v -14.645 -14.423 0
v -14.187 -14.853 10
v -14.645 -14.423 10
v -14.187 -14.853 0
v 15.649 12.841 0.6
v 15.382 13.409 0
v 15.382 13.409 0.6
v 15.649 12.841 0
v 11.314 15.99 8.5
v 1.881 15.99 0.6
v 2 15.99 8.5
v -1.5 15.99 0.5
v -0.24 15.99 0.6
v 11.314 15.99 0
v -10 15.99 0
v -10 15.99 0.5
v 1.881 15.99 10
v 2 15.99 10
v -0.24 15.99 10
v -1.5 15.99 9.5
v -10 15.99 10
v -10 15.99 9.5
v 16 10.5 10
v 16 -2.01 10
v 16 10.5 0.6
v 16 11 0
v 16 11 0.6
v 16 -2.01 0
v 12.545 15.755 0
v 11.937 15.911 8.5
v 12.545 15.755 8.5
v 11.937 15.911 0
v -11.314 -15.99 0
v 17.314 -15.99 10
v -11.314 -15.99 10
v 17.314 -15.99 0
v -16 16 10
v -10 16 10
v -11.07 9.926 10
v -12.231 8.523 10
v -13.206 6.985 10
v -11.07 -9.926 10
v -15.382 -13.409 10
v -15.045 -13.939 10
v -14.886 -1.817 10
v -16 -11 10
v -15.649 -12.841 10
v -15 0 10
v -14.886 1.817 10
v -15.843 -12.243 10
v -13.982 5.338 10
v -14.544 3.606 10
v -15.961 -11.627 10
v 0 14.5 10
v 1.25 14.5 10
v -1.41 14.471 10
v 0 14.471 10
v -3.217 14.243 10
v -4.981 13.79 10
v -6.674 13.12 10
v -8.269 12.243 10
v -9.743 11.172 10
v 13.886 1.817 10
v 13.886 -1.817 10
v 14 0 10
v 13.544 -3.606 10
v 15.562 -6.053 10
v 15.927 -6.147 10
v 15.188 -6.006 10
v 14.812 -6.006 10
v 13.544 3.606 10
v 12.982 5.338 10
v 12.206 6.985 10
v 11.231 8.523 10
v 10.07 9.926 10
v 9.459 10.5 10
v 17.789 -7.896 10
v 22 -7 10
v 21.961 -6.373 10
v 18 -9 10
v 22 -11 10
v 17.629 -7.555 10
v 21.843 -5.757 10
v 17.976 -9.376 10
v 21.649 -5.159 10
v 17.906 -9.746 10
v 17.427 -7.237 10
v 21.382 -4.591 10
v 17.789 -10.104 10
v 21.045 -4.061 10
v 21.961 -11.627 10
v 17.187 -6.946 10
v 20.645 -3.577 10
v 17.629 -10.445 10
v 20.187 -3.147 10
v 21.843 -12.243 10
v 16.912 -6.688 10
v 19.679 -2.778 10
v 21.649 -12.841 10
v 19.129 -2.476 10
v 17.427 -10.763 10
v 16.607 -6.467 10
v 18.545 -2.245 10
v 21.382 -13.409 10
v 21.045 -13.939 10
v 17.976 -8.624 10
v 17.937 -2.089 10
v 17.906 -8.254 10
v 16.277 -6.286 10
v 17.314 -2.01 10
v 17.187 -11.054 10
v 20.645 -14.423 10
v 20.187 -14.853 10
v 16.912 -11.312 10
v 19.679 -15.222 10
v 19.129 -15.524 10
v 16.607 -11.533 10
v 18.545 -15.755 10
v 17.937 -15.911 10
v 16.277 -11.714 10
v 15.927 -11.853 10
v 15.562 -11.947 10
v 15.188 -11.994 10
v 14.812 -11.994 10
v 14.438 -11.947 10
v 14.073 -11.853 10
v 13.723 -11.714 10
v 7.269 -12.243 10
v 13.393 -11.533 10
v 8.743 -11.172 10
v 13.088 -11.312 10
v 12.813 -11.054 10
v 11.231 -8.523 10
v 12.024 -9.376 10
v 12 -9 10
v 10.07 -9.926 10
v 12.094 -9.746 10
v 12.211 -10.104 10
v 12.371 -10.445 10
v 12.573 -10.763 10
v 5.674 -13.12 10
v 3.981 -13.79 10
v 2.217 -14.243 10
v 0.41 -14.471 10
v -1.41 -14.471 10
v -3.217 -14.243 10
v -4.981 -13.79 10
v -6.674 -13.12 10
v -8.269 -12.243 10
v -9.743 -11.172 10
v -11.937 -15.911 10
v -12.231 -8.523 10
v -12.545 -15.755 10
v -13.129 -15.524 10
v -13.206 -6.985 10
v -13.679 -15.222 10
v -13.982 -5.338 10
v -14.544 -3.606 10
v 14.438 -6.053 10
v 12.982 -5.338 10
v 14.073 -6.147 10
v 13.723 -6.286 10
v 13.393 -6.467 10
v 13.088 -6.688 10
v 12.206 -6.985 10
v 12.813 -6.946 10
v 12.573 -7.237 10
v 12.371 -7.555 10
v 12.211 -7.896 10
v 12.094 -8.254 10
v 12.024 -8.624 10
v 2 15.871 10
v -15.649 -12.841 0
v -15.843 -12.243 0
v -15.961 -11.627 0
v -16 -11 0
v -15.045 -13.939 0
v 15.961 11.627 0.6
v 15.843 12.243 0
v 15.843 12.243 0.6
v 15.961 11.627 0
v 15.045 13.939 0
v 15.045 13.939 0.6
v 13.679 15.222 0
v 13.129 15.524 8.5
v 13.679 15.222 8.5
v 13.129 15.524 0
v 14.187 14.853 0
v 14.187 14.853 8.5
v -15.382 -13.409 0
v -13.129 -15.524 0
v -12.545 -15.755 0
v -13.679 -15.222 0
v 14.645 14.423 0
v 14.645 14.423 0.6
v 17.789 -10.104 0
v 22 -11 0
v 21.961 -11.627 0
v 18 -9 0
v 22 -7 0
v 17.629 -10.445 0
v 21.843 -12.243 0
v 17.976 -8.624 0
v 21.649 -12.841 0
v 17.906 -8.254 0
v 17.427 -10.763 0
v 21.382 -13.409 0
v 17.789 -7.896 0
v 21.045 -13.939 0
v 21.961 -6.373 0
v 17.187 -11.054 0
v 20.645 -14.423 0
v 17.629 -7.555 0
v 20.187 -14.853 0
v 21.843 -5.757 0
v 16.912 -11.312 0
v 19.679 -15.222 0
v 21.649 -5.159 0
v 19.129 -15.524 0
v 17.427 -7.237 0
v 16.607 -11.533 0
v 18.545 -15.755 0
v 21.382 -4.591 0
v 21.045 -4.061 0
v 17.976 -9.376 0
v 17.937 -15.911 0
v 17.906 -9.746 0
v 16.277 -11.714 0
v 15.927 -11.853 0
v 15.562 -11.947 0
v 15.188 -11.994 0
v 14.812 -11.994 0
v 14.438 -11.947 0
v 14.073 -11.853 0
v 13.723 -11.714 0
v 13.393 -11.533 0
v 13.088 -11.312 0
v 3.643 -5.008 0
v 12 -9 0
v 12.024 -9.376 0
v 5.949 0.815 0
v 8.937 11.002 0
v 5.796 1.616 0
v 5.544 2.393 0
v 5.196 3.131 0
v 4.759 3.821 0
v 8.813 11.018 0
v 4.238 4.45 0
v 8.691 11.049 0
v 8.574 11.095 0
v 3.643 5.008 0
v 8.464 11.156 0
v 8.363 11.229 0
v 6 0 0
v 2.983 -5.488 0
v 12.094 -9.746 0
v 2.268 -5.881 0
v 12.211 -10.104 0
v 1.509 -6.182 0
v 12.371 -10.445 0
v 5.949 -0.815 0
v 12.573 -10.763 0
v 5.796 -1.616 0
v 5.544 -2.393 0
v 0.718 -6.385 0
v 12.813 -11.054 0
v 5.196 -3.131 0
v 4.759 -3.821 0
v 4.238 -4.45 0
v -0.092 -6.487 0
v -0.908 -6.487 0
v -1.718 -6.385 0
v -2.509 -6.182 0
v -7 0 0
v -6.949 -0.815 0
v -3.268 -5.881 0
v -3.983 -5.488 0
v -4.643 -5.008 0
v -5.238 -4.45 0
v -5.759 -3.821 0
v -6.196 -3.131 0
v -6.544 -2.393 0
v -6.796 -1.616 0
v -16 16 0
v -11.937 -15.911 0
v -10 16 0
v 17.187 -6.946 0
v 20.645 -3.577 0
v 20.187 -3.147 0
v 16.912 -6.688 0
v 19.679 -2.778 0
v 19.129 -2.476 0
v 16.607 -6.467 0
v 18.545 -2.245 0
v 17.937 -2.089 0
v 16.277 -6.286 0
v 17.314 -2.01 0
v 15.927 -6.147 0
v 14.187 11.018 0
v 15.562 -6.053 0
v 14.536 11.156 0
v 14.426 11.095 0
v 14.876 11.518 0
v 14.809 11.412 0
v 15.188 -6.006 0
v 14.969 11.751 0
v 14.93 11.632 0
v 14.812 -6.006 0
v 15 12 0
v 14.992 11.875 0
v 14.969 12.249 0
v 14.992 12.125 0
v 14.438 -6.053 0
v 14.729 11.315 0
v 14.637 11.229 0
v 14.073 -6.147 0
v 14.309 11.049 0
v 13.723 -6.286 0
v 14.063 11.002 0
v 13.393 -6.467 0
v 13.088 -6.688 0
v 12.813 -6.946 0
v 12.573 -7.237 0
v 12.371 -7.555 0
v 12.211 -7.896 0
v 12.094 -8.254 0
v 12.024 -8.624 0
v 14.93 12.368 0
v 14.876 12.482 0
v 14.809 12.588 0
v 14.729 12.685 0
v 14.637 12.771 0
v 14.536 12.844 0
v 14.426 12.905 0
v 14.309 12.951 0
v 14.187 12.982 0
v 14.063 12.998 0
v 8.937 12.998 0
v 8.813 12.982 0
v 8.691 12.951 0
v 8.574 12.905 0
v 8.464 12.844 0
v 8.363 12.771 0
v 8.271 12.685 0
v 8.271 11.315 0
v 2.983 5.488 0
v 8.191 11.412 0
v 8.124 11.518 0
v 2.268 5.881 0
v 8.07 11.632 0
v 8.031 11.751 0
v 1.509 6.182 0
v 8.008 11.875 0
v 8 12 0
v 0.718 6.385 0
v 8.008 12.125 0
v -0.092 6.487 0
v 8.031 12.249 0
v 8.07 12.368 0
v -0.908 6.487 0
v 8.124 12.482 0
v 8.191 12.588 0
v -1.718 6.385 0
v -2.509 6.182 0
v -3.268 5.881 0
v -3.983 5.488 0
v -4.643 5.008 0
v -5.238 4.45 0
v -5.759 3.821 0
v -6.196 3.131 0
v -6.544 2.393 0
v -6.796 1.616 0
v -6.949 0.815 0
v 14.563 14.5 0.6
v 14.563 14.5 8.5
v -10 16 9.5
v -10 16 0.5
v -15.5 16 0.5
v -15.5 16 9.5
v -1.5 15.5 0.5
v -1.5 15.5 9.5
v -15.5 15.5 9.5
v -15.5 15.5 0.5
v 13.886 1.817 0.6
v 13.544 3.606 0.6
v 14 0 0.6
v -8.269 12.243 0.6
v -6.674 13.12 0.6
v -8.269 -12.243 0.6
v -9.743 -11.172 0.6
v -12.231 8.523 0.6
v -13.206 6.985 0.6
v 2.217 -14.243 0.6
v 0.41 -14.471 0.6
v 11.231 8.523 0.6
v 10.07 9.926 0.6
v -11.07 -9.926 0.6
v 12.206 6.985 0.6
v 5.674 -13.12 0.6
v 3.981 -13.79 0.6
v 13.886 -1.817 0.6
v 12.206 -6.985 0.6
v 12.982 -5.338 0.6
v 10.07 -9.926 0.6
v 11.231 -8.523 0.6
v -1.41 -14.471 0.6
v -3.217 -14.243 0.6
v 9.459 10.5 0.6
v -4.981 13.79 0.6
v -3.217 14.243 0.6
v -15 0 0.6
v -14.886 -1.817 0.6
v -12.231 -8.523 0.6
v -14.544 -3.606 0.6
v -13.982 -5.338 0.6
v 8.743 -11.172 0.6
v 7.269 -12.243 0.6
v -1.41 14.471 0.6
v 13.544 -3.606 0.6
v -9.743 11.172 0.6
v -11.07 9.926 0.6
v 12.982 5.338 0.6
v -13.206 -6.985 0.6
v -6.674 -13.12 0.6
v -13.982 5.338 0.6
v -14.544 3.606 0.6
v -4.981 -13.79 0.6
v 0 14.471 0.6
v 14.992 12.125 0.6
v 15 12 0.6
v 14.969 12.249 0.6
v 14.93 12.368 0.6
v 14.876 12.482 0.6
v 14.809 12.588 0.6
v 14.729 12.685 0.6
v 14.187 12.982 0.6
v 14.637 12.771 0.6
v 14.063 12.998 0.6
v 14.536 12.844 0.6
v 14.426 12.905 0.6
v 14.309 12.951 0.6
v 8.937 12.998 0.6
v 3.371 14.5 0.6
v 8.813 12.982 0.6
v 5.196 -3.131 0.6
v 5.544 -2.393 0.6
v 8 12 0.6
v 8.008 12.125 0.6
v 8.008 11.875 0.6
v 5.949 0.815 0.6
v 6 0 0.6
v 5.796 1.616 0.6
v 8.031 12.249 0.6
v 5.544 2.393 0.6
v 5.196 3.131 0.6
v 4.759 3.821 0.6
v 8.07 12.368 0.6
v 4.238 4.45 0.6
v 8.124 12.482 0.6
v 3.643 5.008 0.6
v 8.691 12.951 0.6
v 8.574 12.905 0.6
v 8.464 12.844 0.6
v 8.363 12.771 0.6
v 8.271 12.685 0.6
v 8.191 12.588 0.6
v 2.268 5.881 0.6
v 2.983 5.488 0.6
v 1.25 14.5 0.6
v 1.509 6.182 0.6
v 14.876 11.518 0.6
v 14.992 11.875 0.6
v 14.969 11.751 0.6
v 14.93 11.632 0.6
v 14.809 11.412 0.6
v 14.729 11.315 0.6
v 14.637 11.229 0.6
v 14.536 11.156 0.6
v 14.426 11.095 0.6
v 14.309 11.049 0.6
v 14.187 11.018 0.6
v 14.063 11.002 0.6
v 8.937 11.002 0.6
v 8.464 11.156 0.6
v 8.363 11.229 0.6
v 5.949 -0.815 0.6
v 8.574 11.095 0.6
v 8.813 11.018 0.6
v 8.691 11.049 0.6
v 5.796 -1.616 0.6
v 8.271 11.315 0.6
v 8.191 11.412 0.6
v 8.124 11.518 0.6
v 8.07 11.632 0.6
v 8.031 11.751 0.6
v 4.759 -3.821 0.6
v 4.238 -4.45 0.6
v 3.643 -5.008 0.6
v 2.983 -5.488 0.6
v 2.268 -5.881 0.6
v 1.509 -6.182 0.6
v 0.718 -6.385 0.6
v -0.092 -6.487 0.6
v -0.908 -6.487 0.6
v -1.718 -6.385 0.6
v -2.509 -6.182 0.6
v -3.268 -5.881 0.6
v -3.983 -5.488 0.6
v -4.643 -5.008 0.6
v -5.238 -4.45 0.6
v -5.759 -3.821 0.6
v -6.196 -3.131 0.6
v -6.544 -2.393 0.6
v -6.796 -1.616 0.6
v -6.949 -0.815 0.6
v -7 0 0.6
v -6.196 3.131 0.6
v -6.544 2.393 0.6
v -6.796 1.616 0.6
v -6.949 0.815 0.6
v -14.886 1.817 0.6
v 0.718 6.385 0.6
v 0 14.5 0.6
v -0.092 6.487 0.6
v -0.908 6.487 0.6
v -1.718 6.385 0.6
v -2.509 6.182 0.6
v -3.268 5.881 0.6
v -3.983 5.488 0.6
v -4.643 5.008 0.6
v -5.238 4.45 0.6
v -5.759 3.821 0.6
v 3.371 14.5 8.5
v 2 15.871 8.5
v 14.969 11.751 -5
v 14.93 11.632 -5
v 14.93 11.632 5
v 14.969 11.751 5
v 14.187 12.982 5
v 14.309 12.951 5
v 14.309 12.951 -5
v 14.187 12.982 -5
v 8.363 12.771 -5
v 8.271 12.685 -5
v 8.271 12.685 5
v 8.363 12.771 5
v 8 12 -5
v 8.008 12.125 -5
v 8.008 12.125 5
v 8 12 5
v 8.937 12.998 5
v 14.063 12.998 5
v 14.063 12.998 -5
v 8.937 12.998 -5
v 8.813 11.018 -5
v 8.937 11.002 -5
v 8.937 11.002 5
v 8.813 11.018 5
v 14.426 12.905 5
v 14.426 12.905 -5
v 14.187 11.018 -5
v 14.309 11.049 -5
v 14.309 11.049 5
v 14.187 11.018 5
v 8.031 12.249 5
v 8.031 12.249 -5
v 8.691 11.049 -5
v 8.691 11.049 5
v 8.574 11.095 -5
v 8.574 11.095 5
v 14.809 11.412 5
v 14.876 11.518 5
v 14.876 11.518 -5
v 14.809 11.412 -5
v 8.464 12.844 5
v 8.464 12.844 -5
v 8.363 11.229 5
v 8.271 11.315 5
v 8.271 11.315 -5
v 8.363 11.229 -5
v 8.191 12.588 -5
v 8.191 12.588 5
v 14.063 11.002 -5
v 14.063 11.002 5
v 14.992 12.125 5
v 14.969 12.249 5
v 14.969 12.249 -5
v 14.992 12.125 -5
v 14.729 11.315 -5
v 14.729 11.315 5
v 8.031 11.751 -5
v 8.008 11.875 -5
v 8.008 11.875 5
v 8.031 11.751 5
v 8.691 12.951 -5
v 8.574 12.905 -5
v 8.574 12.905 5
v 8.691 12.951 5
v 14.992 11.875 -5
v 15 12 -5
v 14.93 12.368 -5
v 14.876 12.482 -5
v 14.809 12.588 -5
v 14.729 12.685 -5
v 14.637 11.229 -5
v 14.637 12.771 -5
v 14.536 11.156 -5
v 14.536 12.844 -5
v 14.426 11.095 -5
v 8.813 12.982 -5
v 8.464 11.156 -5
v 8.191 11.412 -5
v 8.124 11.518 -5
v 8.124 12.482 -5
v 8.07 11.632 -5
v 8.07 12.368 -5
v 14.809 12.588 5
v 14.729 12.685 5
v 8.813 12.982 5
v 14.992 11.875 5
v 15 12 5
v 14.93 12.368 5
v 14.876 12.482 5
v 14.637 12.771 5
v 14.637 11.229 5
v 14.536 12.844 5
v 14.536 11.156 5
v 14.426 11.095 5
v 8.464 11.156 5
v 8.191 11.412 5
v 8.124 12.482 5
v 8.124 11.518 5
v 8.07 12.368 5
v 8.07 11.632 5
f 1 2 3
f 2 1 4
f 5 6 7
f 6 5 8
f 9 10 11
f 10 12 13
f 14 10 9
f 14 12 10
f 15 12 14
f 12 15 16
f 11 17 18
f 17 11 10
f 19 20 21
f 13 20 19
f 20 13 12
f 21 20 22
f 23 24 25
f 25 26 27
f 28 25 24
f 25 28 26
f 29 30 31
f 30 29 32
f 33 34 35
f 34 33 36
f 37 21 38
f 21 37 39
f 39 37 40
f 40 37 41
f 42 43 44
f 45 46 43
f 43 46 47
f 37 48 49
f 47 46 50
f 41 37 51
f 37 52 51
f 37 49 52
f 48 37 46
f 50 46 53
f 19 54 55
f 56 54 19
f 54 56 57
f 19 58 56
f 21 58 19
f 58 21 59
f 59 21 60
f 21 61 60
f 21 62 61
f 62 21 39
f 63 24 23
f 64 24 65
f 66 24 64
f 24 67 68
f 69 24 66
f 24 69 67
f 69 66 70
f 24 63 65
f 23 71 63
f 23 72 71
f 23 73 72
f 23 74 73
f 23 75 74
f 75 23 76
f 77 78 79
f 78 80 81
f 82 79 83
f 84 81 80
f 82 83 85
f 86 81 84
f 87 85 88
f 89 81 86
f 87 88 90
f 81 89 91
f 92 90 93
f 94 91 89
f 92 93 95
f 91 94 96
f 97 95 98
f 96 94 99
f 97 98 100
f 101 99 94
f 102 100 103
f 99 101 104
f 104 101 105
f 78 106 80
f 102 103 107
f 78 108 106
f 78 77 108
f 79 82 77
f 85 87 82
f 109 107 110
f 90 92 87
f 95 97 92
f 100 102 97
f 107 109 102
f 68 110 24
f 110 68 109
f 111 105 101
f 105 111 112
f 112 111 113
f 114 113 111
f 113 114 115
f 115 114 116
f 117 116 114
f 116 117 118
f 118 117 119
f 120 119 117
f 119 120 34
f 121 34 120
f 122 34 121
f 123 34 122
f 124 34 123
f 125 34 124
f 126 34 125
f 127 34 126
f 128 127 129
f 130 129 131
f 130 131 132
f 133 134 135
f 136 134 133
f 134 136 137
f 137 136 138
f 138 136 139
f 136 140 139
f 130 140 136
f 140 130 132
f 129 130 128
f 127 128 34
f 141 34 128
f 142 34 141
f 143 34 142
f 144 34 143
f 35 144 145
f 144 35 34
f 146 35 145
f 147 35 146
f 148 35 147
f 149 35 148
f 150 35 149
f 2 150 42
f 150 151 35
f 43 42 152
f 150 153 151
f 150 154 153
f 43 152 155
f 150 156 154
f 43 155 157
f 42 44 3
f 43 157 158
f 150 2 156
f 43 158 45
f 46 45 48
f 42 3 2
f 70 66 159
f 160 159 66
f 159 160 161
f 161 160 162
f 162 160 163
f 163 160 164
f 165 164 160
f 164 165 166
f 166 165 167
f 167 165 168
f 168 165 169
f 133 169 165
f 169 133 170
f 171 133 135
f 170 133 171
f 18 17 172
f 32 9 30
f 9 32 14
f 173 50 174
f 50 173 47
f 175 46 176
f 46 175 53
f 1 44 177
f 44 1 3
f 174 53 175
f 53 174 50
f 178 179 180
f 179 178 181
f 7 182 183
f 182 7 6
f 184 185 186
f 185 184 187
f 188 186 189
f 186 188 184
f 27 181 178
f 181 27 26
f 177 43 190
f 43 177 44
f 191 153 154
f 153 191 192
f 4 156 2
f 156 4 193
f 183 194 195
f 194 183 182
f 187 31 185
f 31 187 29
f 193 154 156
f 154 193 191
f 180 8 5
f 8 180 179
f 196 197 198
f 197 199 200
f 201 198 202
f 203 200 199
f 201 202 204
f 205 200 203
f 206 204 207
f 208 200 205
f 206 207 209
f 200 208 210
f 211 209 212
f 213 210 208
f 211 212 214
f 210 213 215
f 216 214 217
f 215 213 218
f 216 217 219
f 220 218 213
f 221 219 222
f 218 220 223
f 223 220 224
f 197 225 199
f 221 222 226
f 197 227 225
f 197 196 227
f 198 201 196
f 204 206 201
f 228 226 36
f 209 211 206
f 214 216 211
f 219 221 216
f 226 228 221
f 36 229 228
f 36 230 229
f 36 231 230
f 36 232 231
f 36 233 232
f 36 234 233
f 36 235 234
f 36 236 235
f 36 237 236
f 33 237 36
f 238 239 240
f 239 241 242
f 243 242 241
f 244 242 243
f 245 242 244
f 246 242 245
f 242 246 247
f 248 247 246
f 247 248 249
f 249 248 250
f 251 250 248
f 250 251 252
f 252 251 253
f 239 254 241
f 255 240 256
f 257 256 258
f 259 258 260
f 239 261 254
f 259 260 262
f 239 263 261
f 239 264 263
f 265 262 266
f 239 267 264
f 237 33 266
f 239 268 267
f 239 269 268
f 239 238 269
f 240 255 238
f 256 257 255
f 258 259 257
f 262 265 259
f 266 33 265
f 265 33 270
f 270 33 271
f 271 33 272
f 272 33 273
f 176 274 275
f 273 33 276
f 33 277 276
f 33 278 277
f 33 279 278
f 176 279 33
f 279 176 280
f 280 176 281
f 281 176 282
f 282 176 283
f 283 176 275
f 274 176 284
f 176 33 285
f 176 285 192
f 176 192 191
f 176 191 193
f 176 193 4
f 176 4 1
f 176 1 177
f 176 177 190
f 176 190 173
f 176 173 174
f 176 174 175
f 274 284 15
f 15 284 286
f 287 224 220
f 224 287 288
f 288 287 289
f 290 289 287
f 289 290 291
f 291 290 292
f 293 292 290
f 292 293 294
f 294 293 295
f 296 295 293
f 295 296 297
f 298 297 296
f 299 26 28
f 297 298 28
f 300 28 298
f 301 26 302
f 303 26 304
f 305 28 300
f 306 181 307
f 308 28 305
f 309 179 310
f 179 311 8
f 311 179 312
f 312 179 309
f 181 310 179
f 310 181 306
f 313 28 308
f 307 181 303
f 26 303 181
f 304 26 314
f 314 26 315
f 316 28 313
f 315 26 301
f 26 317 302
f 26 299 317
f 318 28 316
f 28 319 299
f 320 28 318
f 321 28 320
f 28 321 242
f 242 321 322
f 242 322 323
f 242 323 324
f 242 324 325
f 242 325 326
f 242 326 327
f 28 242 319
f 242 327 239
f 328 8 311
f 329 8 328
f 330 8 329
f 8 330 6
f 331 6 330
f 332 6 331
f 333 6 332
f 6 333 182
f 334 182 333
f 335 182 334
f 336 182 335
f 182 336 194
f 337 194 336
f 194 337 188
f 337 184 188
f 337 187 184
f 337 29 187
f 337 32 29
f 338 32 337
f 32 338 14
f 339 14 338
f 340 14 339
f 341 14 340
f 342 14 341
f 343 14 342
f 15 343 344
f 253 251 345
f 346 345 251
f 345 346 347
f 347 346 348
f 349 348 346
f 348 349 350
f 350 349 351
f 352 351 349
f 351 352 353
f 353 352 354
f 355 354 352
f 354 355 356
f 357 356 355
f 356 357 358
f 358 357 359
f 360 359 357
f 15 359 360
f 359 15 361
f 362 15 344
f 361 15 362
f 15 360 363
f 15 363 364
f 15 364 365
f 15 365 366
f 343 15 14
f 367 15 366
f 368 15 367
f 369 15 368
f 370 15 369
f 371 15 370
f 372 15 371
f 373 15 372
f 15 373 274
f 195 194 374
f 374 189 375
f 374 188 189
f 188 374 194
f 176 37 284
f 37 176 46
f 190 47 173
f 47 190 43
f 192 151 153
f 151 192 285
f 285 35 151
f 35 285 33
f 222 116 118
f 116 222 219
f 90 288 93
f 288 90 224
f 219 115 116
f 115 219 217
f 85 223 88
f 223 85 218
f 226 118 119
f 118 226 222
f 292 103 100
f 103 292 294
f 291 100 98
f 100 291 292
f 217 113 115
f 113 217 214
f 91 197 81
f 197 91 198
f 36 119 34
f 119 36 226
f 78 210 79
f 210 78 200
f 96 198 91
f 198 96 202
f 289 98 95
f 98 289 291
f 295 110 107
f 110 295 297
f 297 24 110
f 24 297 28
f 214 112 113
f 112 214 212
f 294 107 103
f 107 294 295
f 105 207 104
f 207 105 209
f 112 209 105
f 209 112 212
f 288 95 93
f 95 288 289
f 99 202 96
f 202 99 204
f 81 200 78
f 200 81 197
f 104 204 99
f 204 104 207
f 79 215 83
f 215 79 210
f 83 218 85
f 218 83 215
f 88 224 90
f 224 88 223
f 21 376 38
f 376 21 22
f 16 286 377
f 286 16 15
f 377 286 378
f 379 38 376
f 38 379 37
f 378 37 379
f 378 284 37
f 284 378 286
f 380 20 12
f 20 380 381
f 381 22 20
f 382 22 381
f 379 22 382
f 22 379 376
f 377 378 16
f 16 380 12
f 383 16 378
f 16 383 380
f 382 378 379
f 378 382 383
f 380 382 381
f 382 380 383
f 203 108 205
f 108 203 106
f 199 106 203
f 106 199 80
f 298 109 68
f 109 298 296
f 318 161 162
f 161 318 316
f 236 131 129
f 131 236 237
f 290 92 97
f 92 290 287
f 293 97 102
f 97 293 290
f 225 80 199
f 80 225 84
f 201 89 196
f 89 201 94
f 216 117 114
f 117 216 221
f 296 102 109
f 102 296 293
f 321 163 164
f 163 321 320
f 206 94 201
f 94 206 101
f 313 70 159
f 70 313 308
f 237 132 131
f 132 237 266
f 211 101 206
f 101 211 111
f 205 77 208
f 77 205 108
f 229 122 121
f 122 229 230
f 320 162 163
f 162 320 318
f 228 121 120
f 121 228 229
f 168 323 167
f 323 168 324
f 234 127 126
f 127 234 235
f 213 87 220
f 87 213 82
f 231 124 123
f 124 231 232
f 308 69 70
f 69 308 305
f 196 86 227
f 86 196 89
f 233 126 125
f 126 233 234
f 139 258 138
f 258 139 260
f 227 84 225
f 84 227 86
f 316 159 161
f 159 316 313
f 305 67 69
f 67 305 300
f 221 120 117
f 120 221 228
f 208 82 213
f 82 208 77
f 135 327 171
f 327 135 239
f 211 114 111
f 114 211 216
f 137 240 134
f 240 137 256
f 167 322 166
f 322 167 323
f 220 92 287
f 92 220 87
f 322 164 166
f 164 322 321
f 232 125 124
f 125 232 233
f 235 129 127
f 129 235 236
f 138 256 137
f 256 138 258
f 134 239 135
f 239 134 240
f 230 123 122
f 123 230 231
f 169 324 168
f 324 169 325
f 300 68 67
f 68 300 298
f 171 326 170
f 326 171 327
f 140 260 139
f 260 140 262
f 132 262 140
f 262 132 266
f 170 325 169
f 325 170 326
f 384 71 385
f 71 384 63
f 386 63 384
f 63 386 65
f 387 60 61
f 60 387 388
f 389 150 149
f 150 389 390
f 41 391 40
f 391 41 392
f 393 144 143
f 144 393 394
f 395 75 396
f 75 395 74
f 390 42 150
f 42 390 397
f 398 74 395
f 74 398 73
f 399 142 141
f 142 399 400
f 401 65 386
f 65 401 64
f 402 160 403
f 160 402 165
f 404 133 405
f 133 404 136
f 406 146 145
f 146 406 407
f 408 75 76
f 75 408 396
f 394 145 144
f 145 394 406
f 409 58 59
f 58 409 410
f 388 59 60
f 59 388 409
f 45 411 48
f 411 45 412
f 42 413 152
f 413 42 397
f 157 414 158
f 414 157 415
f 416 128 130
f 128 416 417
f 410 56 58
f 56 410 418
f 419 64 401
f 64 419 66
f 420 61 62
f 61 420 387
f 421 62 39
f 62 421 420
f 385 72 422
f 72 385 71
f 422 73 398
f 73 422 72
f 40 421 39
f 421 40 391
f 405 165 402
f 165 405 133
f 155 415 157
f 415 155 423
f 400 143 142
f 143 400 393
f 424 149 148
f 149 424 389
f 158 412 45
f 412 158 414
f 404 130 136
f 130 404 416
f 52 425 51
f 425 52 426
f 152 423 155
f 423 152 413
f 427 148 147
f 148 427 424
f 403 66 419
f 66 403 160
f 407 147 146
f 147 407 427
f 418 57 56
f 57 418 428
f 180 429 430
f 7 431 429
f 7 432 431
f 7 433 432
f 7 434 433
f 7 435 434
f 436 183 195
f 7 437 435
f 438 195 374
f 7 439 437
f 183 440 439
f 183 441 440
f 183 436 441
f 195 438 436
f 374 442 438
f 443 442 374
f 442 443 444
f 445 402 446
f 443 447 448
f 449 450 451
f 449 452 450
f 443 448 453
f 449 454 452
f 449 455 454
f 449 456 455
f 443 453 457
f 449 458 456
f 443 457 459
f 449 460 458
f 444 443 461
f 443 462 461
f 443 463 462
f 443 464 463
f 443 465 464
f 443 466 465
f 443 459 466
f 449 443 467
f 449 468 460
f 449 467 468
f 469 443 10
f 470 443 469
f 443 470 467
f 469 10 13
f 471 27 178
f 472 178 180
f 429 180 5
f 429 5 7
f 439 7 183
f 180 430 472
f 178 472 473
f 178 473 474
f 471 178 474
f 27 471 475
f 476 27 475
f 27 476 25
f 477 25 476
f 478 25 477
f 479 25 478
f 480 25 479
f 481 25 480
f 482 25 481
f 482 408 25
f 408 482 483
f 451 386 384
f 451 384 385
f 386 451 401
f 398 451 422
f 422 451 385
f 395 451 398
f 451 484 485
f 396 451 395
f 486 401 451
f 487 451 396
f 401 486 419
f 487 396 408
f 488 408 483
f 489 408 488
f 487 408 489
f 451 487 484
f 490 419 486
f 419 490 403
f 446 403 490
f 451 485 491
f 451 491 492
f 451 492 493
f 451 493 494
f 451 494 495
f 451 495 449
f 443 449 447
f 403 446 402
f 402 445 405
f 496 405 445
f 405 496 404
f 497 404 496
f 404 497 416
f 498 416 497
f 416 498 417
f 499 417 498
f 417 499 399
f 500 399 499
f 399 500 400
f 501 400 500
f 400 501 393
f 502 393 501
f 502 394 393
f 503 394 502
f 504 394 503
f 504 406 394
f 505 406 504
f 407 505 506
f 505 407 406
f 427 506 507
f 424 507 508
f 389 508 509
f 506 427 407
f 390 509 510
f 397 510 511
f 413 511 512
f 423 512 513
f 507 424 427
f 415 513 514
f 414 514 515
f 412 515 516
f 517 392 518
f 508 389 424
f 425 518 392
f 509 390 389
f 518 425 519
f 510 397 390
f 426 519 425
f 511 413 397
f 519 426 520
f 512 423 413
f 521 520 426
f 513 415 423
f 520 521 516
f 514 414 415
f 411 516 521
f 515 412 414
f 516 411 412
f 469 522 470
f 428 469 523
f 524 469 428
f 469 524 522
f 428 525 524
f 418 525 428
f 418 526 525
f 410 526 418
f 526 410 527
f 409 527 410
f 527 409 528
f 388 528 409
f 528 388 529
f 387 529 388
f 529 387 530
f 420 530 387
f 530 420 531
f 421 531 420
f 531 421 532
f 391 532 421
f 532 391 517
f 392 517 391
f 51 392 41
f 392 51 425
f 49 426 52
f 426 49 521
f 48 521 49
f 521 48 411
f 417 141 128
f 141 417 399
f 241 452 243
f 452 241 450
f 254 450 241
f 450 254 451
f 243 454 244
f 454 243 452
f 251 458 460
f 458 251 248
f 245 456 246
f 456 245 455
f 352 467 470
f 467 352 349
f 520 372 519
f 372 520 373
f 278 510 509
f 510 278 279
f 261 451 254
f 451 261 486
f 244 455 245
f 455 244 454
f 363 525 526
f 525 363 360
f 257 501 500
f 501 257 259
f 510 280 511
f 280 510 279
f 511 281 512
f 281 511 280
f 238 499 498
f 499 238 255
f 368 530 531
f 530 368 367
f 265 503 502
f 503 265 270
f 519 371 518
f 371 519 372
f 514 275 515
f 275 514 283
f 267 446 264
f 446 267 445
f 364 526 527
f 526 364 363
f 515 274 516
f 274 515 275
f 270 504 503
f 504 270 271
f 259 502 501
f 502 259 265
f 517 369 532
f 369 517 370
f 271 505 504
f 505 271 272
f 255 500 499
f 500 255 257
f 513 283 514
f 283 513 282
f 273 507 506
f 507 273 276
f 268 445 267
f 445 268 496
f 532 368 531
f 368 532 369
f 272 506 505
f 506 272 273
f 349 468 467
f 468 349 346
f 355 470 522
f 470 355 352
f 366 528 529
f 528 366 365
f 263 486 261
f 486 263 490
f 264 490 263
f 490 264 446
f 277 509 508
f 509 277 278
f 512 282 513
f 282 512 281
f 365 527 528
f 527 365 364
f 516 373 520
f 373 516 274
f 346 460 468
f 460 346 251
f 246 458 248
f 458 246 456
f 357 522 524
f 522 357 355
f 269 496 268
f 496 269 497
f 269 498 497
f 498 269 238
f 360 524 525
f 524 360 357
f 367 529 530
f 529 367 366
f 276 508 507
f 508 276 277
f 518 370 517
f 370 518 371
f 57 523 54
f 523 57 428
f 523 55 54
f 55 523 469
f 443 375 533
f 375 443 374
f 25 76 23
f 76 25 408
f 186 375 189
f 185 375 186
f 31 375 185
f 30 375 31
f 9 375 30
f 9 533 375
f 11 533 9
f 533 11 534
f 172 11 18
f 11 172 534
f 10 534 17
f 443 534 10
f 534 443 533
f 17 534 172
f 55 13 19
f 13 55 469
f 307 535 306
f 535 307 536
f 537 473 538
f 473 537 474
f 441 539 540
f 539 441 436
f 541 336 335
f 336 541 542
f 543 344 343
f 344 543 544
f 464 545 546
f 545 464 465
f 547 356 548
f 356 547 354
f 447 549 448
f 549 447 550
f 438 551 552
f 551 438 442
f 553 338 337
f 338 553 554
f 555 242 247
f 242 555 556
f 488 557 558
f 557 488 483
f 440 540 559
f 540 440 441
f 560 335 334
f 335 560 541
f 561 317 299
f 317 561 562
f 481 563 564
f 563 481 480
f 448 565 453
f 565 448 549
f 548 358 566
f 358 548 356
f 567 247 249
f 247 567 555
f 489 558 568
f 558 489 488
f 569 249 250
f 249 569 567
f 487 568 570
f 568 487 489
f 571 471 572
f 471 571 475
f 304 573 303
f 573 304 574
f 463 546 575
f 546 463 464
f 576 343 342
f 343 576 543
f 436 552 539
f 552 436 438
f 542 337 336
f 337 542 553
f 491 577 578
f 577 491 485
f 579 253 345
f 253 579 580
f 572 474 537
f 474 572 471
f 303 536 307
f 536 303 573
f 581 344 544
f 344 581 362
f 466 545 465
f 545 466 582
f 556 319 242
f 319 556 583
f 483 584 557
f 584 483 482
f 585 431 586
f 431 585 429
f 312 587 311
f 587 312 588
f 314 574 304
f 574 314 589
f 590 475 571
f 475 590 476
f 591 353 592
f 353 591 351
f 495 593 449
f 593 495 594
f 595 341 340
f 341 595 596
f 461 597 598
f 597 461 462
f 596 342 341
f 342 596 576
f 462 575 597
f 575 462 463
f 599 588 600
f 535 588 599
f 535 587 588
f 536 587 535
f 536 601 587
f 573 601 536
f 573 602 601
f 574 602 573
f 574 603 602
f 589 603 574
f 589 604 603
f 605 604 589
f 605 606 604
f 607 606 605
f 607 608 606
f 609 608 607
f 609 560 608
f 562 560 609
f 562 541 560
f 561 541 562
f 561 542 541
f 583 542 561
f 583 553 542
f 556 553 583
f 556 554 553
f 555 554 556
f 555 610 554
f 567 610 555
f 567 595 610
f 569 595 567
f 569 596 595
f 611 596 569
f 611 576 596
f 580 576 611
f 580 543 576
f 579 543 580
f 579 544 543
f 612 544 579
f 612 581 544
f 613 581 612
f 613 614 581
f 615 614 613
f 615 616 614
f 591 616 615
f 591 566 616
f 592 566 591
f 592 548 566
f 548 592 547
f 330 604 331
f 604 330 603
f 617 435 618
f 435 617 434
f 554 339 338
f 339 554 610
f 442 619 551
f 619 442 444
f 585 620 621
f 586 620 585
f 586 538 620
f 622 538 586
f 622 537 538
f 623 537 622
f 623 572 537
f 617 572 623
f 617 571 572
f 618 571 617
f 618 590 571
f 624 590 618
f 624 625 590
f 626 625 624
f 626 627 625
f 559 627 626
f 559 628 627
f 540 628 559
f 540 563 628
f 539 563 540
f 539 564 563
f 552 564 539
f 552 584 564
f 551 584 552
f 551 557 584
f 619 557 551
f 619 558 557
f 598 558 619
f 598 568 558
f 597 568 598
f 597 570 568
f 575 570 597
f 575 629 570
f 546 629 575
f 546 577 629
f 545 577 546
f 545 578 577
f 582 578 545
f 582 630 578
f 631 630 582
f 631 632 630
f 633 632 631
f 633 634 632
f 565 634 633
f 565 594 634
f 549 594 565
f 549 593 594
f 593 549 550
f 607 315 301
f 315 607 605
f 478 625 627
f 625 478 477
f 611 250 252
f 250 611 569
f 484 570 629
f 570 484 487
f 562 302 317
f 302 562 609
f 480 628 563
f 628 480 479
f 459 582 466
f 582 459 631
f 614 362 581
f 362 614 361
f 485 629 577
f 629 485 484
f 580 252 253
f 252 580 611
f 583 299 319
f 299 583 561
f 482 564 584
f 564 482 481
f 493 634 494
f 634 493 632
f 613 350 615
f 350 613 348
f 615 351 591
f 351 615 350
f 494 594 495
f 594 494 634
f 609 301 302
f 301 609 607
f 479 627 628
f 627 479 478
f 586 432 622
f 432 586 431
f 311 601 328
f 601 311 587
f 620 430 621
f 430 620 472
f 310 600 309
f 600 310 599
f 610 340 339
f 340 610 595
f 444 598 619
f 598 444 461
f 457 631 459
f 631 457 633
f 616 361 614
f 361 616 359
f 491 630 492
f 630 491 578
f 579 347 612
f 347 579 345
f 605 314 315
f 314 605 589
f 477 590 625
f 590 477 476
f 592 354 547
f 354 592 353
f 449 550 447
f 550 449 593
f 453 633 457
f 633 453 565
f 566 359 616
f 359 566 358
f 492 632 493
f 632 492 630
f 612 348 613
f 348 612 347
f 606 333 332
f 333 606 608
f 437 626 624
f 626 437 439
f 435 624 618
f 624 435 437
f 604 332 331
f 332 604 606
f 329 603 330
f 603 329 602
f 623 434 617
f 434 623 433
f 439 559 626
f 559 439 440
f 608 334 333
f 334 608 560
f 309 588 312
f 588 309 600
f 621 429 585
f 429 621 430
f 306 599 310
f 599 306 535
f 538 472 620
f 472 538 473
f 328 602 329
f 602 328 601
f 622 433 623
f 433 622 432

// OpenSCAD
$fn = 50;


union() {
	difference() {
		union() {
			hull() {
				translate(v = [-11.0000000000, 11.0000000000, 0]) {
					cylinder(h = 10, r = 5);
				}
				translate(v = [11.0000000000, 11.0000000000, 0]) {
					cylinder(h = 10, r = 5);
				}
				translate(v = [-11.0000000000, -11.0000000000, 0]) {
					cylinder(h = 10, r = 5);
				}
				translate(v = [11.0000000000, -11.0000000000, 0]) {
					cylinder(h = 10, r = 5);
				}
			}
			translate(v = [7.5000000000, -9.0000000000, 0]) {
				hull() {
					translate(v = [-9.5000000000, 2.0000000000, 0]) {
						cylinder(h = 10, r = 5);
					}
					translate(v = [9.5000000000, 2.0000000000, 0]) {
						cylinder(h = 10, r = 5);
					}
					translate(v = [-9.5000000000, -2.0000000000, 0]) {
						cylinder(h = 10, r = 5);
					}
					translate(v = [9.5000000000, -2.0000000000, 0]) {
						cylinder(h = 10, r = 5);
					}
				}
			}
			translate(v = [-16.0000000000, 10.0000000000, 0]) {
				cube(size = [6, 6, 10]);
			}
		}
		union() {
			translate(v = [-15.5000000000, 15.5000000000, 0.5000000000]) {
				cube(size = [14, 0.5000000000, 9.0000000000]);
			}
			translate(v = [15.0000000000, -9.0000000000, -100.0000000000]) {
				cylinder(h = 200, r = 3.0000000000);
			}
			translate(v = [-0.5000000000, 0.0000000000, 0.6000000000]) {
				cylinder(h = 12.4000000000, r = 14.5000000000);
			}
			translate(v = [-0.5000000000, 0.0000000000, -5.0000000000]) {
				cylinder(h = 10, r = 6.5000000000);
			}
			translate(v = [0.0000000000, 10.5000000000, 0.6000000000]) {
				cube(size = [16.0000000000, 4, 12.4000000000]);
			}
			translate(v = [2.0000000000, 10.5000000000, 8.5000000000]) {
				cube(size = [14.0000000000, 7, 1.5000000000]);
			}
			translate(v = [-3.0000000000, 18.7500000000, 0.6000000000]) {
				rotate(a = [0, 0, -45]) {
					cube(size = [10, 1.5000000000, 12.4000000000]);
				}
			}
			translate(v = [2.2500000000, 11.0000000000, 0.6000000000]) {
				cube(size = [7.5000000000, 2, 9.4000000000]);
			}
		}
	}
	union() {
		translate(v = [11.5000000000, 12, -5.0000000000]) {
			rotate(a = [0, 0, 0]) {
				difference() {
					union() {
						hull() {
							translate(v = [2.5000000000, 0, 0]) {
								cylinder(h = 10, r = 1.0000000000, r1 = 1.0000000000, r2 = 1.0000000000);
							}
							translate(v = [-2.5000000000, 0, 0]) {
								cylinder(h = 10, r = 1.0000000000, r1 = 1.0000000000, r2 = 1.0000000000);
							}
						}
					}
					union();
				}
			}
		}
	}
}
